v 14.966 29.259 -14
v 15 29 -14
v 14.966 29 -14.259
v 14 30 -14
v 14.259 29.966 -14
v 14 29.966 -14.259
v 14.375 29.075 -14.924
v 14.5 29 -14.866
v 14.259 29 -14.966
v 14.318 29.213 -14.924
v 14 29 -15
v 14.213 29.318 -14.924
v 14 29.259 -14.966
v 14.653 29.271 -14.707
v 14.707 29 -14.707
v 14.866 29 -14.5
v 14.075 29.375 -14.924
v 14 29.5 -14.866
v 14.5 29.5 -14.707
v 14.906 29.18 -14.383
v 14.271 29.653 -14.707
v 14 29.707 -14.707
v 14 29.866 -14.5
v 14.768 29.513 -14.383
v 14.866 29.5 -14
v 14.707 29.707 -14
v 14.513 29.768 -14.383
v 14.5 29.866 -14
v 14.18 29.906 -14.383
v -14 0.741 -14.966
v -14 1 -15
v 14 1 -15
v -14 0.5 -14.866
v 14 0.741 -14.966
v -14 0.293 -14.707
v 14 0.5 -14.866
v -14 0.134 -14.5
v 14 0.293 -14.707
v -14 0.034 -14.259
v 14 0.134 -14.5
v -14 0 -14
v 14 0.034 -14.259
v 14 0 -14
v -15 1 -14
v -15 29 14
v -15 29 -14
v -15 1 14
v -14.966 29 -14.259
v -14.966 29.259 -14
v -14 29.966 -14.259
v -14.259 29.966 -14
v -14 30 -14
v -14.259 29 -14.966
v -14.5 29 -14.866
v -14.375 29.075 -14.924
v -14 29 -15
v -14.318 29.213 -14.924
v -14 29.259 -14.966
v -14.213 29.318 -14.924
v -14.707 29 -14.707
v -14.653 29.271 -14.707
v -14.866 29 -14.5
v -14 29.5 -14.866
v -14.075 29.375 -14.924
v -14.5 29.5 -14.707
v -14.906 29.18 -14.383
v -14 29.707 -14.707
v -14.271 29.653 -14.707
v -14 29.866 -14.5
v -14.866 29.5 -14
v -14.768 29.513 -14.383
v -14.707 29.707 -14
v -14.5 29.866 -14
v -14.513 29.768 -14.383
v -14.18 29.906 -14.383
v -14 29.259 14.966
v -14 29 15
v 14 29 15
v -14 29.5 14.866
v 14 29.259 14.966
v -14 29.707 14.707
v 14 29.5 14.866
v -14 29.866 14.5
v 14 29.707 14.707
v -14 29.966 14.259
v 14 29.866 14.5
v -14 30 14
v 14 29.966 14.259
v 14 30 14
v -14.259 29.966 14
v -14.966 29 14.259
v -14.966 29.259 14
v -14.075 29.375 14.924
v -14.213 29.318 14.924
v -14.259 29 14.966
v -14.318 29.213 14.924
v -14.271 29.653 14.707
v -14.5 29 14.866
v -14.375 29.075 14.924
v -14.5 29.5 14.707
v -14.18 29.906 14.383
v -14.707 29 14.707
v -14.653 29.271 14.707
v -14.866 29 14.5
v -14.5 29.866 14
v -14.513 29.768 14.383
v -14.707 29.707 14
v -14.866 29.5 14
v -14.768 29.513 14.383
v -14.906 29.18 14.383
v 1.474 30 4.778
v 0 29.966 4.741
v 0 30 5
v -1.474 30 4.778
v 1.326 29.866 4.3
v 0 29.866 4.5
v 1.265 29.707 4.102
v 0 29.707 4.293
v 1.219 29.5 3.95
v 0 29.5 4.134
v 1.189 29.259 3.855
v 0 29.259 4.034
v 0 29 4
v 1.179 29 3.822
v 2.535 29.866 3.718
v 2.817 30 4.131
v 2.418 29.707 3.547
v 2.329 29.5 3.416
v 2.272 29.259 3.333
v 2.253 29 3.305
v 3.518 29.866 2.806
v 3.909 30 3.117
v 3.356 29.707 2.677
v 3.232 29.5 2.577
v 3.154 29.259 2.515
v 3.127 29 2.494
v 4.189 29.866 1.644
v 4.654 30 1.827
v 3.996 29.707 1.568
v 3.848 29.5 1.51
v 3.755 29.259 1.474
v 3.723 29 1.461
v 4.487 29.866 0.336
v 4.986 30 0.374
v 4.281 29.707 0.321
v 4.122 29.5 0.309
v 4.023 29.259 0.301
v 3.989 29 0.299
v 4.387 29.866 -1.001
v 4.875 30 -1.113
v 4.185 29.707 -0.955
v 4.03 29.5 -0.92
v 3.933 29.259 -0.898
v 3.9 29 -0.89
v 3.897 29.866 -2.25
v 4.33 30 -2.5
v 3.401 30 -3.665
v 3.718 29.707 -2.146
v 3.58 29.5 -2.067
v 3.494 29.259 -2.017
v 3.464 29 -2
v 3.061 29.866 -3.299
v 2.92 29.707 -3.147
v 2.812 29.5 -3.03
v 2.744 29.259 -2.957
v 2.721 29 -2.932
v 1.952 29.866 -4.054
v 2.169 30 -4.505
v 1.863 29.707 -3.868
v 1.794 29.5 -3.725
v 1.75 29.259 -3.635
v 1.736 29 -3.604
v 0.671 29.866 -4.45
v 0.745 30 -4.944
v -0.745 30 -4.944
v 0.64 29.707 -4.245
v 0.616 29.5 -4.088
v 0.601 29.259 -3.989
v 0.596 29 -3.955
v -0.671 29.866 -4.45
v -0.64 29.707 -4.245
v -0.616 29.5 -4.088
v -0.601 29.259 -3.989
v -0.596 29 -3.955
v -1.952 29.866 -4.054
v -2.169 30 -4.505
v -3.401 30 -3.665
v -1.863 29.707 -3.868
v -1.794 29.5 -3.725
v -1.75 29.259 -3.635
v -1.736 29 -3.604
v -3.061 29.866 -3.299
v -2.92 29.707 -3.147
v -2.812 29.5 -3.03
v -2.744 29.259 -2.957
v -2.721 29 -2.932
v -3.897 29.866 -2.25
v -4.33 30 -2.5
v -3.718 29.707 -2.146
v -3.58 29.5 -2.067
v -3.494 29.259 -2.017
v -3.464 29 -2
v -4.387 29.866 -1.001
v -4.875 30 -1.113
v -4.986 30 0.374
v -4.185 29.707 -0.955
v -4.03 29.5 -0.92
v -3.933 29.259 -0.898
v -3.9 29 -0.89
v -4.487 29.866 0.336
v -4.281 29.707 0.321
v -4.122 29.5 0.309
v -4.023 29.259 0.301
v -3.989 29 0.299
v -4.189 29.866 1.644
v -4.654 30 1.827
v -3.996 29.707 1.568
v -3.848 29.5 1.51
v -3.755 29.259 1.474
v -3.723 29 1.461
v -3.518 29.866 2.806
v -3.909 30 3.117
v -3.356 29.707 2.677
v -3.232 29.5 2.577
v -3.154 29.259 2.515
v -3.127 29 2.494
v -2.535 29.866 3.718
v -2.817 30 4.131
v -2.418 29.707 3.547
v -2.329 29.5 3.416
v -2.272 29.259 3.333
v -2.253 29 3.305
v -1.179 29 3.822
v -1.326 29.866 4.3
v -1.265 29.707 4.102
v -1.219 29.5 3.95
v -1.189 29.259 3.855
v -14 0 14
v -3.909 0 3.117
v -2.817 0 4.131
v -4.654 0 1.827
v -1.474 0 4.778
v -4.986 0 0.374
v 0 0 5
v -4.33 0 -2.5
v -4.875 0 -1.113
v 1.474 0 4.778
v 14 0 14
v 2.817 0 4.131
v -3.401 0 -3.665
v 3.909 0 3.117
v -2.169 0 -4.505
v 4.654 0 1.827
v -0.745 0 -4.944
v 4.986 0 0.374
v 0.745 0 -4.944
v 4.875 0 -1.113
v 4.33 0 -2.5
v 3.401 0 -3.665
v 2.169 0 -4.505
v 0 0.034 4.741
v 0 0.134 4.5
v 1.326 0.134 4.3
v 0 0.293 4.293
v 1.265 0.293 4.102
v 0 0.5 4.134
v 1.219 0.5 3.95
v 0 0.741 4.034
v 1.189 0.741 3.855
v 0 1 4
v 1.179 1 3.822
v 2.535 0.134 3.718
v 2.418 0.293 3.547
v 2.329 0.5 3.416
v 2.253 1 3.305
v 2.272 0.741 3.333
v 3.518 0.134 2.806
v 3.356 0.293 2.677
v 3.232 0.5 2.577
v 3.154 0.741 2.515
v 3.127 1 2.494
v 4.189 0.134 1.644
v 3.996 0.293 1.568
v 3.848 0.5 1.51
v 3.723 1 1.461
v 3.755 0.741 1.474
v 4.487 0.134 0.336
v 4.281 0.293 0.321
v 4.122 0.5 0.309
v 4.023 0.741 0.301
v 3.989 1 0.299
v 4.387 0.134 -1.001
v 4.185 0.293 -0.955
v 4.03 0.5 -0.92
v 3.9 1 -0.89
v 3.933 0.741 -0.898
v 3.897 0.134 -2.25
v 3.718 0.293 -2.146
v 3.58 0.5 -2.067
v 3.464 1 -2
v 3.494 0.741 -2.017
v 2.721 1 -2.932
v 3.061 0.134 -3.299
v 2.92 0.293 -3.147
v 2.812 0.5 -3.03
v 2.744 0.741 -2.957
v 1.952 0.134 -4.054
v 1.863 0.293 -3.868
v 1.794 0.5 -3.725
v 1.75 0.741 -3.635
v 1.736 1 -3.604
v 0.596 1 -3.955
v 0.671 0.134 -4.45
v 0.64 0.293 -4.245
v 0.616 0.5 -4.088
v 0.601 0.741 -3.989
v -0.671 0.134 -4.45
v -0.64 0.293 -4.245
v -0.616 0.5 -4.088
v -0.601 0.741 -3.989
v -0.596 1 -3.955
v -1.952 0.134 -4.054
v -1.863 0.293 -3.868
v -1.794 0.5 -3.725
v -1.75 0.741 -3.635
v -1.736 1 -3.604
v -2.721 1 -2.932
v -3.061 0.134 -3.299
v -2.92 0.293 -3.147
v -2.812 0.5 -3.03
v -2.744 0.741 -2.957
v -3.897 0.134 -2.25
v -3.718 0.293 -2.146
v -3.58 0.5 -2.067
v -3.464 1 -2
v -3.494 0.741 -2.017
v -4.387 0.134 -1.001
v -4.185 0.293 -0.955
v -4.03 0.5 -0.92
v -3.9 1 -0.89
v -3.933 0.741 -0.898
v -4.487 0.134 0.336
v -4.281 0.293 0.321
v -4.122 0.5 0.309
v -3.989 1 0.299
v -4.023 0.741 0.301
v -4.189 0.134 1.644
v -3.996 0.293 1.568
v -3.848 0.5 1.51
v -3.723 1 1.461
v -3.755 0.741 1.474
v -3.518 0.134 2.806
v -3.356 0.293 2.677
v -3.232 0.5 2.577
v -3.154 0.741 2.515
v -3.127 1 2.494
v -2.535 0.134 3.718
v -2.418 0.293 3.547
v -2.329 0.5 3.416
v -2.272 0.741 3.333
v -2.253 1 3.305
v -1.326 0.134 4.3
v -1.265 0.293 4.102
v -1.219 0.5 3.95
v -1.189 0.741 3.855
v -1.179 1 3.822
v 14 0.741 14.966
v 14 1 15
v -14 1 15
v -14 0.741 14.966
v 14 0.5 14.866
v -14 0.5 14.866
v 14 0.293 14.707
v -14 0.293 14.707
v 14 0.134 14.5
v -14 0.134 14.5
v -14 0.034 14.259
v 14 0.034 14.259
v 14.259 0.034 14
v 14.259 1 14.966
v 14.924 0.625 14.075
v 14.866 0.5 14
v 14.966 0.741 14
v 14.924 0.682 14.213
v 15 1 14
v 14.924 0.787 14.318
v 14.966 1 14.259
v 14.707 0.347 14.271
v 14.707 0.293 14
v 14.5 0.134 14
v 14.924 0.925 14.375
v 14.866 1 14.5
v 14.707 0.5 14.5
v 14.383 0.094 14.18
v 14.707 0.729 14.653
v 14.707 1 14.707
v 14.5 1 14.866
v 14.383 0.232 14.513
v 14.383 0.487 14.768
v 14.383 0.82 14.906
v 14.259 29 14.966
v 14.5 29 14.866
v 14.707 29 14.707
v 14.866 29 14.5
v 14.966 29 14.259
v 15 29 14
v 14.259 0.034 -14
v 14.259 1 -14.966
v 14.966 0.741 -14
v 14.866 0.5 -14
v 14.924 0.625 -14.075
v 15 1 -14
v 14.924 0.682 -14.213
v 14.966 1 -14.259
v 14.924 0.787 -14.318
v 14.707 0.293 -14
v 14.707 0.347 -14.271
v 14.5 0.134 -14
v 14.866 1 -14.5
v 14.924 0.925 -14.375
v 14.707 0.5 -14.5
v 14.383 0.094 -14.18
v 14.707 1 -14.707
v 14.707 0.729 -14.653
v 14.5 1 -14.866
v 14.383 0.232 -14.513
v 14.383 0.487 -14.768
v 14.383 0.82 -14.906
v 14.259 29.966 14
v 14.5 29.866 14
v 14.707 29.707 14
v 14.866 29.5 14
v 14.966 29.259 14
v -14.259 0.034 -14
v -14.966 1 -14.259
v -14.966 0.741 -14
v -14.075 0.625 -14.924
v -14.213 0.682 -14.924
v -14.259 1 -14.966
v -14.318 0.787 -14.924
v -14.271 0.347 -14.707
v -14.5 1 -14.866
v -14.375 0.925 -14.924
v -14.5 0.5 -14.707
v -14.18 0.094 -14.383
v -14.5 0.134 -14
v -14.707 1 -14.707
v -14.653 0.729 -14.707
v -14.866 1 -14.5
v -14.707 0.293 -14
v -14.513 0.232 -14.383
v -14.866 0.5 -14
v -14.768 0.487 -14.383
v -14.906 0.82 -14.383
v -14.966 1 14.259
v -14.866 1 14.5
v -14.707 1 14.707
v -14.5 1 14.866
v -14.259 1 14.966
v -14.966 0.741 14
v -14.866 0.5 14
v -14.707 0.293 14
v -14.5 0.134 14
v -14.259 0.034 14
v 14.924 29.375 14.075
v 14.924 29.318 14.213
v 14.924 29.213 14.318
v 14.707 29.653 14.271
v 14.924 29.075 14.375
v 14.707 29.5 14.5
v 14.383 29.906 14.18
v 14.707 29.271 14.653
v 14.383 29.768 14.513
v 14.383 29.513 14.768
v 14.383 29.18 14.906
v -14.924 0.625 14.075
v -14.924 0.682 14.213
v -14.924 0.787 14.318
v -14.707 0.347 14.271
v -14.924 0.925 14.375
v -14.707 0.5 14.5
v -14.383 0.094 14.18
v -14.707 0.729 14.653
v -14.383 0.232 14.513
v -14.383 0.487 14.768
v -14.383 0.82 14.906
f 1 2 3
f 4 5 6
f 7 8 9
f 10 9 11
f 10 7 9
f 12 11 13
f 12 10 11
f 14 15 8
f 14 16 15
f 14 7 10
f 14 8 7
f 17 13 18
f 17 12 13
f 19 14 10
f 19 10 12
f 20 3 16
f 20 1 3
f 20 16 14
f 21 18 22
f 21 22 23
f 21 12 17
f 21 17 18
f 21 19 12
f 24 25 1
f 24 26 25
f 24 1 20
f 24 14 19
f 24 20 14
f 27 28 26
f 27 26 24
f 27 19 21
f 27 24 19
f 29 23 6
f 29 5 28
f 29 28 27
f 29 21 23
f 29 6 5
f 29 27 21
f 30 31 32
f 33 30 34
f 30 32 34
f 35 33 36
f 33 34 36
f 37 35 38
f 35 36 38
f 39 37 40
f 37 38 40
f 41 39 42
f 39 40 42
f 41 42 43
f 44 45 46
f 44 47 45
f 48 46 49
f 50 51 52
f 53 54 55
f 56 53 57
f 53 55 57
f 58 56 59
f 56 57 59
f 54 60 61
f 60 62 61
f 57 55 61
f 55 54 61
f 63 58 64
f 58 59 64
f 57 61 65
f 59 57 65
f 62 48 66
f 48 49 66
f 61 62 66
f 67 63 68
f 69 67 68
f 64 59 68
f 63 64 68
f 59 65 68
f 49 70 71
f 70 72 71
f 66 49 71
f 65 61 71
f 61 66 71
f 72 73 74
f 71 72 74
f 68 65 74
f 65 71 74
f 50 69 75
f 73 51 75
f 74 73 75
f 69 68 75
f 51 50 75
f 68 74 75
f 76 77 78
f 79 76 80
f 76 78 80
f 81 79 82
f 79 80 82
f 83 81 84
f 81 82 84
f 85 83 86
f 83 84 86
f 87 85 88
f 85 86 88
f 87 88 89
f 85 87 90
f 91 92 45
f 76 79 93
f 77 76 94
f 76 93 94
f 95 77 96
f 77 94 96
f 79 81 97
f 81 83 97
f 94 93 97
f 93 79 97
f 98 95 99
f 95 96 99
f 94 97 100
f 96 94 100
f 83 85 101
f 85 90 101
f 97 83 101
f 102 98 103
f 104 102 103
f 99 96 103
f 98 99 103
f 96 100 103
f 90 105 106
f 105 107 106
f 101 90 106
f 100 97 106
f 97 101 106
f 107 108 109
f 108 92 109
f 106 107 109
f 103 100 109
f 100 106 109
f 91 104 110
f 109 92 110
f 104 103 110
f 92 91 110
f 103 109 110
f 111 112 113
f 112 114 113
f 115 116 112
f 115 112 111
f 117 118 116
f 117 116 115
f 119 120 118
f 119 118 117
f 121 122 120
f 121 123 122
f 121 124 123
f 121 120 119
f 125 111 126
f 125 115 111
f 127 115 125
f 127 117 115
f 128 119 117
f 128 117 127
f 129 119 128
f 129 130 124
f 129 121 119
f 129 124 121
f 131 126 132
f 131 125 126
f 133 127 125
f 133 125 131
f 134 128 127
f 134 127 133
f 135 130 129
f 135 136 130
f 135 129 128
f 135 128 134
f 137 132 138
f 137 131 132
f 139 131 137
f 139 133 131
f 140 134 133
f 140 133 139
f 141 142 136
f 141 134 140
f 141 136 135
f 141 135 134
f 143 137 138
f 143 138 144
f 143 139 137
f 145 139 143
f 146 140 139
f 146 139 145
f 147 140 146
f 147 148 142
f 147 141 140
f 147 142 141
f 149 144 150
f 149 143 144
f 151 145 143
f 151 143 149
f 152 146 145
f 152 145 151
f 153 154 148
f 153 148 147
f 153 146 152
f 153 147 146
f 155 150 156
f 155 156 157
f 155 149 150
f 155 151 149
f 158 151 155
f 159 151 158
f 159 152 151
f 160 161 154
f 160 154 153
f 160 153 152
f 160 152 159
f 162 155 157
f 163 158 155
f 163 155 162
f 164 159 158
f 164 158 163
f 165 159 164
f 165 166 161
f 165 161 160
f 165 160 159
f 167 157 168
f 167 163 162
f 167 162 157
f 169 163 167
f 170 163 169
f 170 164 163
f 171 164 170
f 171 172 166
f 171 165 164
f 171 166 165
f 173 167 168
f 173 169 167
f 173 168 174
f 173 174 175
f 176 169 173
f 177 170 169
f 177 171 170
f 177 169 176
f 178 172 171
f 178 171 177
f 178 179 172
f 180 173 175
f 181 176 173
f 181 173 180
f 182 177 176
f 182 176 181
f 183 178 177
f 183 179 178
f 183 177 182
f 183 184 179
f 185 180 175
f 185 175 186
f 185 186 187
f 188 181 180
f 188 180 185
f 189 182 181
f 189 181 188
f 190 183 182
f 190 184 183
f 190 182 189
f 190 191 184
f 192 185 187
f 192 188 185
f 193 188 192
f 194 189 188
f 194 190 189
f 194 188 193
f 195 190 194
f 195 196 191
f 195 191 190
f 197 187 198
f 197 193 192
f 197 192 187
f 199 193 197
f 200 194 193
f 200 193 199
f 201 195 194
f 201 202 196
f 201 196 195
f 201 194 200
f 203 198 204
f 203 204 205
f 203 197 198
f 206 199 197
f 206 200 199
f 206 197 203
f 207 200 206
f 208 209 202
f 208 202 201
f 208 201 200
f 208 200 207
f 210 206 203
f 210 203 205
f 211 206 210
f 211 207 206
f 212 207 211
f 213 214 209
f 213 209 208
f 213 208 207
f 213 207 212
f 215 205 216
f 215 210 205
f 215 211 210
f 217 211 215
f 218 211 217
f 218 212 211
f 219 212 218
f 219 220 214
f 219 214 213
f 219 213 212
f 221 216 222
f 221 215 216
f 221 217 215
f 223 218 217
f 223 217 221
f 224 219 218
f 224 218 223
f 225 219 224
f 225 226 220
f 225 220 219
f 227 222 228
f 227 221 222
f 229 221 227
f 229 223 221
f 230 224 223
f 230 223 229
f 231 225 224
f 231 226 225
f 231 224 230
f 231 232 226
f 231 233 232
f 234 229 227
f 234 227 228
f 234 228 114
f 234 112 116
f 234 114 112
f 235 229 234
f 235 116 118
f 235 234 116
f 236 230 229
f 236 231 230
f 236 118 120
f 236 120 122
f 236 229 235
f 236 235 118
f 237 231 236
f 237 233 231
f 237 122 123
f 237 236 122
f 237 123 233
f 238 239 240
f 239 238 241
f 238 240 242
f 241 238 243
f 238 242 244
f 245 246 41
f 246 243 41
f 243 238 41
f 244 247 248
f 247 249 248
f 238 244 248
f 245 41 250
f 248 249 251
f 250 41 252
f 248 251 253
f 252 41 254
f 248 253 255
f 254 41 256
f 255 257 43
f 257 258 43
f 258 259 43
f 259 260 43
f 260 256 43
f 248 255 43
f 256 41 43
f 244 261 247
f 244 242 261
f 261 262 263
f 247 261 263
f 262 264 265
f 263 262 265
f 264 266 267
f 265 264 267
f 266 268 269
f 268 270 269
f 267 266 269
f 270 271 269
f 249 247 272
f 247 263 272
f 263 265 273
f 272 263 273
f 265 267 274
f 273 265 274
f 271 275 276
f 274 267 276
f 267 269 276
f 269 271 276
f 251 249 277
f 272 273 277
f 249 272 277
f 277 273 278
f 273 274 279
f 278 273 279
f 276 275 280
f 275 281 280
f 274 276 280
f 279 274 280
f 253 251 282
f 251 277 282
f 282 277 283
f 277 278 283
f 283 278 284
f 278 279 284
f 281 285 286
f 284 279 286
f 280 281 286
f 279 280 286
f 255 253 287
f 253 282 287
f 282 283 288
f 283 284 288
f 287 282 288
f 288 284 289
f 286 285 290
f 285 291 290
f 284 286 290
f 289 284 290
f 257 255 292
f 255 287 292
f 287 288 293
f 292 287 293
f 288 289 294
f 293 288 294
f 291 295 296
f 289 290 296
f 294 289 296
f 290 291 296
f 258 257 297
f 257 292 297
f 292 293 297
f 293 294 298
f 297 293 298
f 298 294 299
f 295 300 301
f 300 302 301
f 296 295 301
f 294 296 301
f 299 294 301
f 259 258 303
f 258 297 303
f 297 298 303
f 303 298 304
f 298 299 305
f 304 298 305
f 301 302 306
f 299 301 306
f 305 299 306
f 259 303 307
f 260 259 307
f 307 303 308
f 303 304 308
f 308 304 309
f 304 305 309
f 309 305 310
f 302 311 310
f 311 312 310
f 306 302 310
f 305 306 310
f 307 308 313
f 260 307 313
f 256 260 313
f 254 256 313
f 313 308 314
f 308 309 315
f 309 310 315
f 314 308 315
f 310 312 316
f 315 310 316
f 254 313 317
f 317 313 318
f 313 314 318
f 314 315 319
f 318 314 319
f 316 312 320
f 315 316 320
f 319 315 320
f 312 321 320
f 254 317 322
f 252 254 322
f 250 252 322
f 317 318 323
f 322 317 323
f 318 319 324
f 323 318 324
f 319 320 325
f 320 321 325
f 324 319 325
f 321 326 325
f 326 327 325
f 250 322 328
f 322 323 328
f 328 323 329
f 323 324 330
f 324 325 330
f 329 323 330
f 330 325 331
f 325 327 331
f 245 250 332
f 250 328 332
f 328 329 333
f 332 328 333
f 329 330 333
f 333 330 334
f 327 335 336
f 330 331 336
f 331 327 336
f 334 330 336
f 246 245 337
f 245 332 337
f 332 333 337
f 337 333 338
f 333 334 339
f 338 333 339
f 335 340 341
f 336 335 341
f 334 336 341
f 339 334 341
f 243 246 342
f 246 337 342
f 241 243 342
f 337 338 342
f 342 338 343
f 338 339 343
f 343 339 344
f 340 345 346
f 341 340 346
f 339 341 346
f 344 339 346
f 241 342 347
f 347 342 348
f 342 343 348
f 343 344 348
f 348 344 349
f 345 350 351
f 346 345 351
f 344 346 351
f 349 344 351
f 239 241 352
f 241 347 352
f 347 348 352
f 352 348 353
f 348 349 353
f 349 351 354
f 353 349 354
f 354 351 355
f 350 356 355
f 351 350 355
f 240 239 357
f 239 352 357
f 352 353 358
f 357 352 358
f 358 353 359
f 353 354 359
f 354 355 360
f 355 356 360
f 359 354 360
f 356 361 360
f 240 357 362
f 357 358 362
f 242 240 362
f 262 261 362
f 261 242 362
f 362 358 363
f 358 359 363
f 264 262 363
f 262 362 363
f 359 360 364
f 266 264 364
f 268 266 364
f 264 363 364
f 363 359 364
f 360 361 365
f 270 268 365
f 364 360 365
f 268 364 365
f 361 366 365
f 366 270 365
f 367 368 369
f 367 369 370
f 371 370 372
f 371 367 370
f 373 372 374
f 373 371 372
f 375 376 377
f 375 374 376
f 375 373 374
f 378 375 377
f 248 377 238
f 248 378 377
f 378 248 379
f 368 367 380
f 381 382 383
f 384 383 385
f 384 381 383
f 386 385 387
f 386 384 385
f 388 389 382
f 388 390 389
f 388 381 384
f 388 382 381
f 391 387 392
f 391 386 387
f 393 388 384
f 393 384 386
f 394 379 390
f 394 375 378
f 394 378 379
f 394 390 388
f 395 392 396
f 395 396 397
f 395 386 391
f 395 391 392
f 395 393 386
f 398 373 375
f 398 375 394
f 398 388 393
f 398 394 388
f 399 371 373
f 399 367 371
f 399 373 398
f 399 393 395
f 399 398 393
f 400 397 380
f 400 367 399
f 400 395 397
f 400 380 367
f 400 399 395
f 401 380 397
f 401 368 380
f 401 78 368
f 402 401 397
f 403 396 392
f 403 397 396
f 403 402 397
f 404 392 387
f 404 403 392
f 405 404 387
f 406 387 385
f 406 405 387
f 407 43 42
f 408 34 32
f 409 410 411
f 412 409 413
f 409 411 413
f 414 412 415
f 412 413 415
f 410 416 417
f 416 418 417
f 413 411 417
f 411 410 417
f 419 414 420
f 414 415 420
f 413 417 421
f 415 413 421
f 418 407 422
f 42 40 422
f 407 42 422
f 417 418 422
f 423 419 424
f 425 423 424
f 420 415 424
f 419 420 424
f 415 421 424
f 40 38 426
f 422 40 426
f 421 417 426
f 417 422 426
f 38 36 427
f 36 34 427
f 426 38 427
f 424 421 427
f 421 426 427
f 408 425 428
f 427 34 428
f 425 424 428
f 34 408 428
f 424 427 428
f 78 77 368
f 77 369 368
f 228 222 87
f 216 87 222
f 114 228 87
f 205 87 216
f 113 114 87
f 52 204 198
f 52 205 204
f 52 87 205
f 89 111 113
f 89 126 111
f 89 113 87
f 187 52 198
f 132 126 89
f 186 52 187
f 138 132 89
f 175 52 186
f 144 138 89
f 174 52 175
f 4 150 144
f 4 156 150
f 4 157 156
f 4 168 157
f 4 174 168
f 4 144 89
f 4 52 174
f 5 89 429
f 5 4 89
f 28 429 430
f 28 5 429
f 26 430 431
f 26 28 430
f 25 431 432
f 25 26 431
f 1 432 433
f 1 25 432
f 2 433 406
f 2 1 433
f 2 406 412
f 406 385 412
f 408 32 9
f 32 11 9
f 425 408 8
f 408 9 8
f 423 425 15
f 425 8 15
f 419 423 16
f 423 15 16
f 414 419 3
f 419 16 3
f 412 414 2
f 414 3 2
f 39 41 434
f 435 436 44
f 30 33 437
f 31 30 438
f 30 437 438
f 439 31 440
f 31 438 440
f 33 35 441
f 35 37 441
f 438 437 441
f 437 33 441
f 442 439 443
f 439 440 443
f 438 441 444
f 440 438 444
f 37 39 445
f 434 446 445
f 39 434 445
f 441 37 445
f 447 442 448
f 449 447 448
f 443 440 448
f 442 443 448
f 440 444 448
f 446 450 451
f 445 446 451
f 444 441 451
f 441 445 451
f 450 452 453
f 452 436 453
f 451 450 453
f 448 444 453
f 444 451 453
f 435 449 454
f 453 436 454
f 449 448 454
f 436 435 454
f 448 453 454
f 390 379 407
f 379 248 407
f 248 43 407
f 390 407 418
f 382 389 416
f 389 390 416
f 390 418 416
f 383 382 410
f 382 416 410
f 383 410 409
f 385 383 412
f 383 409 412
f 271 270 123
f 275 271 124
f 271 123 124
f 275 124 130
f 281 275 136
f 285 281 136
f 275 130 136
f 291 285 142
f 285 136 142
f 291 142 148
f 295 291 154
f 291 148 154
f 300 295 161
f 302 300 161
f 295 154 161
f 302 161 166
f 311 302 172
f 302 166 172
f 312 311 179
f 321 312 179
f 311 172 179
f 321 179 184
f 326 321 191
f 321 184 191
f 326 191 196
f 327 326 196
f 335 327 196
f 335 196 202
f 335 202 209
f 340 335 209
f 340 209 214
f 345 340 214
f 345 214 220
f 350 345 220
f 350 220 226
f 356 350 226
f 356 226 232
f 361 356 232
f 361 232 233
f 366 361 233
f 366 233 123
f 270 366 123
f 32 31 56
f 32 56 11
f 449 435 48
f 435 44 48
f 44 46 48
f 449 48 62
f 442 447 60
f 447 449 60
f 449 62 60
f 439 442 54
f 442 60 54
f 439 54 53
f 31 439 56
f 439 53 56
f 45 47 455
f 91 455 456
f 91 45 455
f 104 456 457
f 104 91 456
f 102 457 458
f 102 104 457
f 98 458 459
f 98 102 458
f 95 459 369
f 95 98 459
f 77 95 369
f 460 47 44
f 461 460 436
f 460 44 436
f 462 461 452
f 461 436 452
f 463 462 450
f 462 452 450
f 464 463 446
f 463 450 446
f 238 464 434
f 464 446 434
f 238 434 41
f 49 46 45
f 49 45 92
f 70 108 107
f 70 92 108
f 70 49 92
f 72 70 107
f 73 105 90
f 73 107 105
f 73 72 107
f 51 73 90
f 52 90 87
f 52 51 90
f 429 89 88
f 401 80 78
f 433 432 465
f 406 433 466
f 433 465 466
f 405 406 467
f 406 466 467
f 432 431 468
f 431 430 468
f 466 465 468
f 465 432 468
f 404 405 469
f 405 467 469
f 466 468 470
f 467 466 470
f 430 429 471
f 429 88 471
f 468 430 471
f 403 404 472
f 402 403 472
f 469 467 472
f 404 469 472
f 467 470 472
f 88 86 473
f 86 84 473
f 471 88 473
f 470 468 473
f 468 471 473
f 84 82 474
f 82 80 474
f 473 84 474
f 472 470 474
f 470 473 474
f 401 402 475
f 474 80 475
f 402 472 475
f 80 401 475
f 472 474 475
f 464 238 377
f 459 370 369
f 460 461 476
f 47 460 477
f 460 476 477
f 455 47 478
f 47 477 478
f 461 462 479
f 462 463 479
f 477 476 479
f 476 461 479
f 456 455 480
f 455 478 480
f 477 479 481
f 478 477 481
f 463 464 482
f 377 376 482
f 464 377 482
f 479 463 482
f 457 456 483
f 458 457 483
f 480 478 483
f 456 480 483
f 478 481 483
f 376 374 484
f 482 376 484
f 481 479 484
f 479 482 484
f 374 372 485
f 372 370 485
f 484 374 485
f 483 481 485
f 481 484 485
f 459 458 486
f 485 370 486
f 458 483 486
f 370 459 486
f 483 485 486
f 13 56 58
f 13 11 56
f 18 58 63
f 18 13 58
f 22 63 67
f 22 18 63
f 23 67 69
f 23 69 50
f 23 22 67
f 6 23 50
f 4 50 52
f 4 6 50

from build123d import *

# Parameters (mm, degrees)
SKIZZE1_W                       = 30
SKIZZE1_H                       = 30
AUFSATZ_LINEAR_AUSTRAGEN1_DEPTH = 30
SKIZZE2_R                       = 4
SCHNITT_LINEAR_AUSTRAGEN1_DEPTH = 31
VERRUNDUNG1_R                   = 1


with BuildPart() as part:
    # Skizze1 → Aufsatz-Linear austragen1 (new body)
    with BuildSketch(Plane(origin=(0, 0, 0), x_dir=(1, 0, 0), z_dir=(0, 1, 0))):
        Rectangle(SKIZZE1_W, SKIZZE1_H)
    extrude(amount=AUFSATZ_LINEAR_AUSTRAGEN1_DEPTH)

    # Skizze2 → Schnitt-Linear austragen1 (cut)
    with BuildSketch(Plane(origin=(0, 30, 0), x_dir=(1, 0, 0), z_dir=(0, 1, 0))):
        with Locations(Location((0, 0, 0), (0, 0, 270))):
            Circle(SKIZZE2_R)
    extrude(amount=-SCHNITT_LINEAR_AUSTRAGEN1_DEPTH, mode=Mode.SUBTRACT)

    # Verrundung1
    verrundung1_edges = [part.edges().sort_by_distance(p)[0] for p in [
        (-15, 30, 0),
        (0, 0, -4),
        (0, 30, -4),
        (0, 30, 15),
        (15, 30, 0),
        (0, 0, 15),
        (-15, 0, 0),
        (0, 0, -15),
        (15, 0, 0),
        (15, 15, 15),
        (-15, 15, 15),
        (-15, 15, -15),
        (15, 15, -15),
        (0, 30, -15),
    ]]
    fillet(verrundung1_edges, radius=VERRUNDUNG1_R)


solid = part.part
